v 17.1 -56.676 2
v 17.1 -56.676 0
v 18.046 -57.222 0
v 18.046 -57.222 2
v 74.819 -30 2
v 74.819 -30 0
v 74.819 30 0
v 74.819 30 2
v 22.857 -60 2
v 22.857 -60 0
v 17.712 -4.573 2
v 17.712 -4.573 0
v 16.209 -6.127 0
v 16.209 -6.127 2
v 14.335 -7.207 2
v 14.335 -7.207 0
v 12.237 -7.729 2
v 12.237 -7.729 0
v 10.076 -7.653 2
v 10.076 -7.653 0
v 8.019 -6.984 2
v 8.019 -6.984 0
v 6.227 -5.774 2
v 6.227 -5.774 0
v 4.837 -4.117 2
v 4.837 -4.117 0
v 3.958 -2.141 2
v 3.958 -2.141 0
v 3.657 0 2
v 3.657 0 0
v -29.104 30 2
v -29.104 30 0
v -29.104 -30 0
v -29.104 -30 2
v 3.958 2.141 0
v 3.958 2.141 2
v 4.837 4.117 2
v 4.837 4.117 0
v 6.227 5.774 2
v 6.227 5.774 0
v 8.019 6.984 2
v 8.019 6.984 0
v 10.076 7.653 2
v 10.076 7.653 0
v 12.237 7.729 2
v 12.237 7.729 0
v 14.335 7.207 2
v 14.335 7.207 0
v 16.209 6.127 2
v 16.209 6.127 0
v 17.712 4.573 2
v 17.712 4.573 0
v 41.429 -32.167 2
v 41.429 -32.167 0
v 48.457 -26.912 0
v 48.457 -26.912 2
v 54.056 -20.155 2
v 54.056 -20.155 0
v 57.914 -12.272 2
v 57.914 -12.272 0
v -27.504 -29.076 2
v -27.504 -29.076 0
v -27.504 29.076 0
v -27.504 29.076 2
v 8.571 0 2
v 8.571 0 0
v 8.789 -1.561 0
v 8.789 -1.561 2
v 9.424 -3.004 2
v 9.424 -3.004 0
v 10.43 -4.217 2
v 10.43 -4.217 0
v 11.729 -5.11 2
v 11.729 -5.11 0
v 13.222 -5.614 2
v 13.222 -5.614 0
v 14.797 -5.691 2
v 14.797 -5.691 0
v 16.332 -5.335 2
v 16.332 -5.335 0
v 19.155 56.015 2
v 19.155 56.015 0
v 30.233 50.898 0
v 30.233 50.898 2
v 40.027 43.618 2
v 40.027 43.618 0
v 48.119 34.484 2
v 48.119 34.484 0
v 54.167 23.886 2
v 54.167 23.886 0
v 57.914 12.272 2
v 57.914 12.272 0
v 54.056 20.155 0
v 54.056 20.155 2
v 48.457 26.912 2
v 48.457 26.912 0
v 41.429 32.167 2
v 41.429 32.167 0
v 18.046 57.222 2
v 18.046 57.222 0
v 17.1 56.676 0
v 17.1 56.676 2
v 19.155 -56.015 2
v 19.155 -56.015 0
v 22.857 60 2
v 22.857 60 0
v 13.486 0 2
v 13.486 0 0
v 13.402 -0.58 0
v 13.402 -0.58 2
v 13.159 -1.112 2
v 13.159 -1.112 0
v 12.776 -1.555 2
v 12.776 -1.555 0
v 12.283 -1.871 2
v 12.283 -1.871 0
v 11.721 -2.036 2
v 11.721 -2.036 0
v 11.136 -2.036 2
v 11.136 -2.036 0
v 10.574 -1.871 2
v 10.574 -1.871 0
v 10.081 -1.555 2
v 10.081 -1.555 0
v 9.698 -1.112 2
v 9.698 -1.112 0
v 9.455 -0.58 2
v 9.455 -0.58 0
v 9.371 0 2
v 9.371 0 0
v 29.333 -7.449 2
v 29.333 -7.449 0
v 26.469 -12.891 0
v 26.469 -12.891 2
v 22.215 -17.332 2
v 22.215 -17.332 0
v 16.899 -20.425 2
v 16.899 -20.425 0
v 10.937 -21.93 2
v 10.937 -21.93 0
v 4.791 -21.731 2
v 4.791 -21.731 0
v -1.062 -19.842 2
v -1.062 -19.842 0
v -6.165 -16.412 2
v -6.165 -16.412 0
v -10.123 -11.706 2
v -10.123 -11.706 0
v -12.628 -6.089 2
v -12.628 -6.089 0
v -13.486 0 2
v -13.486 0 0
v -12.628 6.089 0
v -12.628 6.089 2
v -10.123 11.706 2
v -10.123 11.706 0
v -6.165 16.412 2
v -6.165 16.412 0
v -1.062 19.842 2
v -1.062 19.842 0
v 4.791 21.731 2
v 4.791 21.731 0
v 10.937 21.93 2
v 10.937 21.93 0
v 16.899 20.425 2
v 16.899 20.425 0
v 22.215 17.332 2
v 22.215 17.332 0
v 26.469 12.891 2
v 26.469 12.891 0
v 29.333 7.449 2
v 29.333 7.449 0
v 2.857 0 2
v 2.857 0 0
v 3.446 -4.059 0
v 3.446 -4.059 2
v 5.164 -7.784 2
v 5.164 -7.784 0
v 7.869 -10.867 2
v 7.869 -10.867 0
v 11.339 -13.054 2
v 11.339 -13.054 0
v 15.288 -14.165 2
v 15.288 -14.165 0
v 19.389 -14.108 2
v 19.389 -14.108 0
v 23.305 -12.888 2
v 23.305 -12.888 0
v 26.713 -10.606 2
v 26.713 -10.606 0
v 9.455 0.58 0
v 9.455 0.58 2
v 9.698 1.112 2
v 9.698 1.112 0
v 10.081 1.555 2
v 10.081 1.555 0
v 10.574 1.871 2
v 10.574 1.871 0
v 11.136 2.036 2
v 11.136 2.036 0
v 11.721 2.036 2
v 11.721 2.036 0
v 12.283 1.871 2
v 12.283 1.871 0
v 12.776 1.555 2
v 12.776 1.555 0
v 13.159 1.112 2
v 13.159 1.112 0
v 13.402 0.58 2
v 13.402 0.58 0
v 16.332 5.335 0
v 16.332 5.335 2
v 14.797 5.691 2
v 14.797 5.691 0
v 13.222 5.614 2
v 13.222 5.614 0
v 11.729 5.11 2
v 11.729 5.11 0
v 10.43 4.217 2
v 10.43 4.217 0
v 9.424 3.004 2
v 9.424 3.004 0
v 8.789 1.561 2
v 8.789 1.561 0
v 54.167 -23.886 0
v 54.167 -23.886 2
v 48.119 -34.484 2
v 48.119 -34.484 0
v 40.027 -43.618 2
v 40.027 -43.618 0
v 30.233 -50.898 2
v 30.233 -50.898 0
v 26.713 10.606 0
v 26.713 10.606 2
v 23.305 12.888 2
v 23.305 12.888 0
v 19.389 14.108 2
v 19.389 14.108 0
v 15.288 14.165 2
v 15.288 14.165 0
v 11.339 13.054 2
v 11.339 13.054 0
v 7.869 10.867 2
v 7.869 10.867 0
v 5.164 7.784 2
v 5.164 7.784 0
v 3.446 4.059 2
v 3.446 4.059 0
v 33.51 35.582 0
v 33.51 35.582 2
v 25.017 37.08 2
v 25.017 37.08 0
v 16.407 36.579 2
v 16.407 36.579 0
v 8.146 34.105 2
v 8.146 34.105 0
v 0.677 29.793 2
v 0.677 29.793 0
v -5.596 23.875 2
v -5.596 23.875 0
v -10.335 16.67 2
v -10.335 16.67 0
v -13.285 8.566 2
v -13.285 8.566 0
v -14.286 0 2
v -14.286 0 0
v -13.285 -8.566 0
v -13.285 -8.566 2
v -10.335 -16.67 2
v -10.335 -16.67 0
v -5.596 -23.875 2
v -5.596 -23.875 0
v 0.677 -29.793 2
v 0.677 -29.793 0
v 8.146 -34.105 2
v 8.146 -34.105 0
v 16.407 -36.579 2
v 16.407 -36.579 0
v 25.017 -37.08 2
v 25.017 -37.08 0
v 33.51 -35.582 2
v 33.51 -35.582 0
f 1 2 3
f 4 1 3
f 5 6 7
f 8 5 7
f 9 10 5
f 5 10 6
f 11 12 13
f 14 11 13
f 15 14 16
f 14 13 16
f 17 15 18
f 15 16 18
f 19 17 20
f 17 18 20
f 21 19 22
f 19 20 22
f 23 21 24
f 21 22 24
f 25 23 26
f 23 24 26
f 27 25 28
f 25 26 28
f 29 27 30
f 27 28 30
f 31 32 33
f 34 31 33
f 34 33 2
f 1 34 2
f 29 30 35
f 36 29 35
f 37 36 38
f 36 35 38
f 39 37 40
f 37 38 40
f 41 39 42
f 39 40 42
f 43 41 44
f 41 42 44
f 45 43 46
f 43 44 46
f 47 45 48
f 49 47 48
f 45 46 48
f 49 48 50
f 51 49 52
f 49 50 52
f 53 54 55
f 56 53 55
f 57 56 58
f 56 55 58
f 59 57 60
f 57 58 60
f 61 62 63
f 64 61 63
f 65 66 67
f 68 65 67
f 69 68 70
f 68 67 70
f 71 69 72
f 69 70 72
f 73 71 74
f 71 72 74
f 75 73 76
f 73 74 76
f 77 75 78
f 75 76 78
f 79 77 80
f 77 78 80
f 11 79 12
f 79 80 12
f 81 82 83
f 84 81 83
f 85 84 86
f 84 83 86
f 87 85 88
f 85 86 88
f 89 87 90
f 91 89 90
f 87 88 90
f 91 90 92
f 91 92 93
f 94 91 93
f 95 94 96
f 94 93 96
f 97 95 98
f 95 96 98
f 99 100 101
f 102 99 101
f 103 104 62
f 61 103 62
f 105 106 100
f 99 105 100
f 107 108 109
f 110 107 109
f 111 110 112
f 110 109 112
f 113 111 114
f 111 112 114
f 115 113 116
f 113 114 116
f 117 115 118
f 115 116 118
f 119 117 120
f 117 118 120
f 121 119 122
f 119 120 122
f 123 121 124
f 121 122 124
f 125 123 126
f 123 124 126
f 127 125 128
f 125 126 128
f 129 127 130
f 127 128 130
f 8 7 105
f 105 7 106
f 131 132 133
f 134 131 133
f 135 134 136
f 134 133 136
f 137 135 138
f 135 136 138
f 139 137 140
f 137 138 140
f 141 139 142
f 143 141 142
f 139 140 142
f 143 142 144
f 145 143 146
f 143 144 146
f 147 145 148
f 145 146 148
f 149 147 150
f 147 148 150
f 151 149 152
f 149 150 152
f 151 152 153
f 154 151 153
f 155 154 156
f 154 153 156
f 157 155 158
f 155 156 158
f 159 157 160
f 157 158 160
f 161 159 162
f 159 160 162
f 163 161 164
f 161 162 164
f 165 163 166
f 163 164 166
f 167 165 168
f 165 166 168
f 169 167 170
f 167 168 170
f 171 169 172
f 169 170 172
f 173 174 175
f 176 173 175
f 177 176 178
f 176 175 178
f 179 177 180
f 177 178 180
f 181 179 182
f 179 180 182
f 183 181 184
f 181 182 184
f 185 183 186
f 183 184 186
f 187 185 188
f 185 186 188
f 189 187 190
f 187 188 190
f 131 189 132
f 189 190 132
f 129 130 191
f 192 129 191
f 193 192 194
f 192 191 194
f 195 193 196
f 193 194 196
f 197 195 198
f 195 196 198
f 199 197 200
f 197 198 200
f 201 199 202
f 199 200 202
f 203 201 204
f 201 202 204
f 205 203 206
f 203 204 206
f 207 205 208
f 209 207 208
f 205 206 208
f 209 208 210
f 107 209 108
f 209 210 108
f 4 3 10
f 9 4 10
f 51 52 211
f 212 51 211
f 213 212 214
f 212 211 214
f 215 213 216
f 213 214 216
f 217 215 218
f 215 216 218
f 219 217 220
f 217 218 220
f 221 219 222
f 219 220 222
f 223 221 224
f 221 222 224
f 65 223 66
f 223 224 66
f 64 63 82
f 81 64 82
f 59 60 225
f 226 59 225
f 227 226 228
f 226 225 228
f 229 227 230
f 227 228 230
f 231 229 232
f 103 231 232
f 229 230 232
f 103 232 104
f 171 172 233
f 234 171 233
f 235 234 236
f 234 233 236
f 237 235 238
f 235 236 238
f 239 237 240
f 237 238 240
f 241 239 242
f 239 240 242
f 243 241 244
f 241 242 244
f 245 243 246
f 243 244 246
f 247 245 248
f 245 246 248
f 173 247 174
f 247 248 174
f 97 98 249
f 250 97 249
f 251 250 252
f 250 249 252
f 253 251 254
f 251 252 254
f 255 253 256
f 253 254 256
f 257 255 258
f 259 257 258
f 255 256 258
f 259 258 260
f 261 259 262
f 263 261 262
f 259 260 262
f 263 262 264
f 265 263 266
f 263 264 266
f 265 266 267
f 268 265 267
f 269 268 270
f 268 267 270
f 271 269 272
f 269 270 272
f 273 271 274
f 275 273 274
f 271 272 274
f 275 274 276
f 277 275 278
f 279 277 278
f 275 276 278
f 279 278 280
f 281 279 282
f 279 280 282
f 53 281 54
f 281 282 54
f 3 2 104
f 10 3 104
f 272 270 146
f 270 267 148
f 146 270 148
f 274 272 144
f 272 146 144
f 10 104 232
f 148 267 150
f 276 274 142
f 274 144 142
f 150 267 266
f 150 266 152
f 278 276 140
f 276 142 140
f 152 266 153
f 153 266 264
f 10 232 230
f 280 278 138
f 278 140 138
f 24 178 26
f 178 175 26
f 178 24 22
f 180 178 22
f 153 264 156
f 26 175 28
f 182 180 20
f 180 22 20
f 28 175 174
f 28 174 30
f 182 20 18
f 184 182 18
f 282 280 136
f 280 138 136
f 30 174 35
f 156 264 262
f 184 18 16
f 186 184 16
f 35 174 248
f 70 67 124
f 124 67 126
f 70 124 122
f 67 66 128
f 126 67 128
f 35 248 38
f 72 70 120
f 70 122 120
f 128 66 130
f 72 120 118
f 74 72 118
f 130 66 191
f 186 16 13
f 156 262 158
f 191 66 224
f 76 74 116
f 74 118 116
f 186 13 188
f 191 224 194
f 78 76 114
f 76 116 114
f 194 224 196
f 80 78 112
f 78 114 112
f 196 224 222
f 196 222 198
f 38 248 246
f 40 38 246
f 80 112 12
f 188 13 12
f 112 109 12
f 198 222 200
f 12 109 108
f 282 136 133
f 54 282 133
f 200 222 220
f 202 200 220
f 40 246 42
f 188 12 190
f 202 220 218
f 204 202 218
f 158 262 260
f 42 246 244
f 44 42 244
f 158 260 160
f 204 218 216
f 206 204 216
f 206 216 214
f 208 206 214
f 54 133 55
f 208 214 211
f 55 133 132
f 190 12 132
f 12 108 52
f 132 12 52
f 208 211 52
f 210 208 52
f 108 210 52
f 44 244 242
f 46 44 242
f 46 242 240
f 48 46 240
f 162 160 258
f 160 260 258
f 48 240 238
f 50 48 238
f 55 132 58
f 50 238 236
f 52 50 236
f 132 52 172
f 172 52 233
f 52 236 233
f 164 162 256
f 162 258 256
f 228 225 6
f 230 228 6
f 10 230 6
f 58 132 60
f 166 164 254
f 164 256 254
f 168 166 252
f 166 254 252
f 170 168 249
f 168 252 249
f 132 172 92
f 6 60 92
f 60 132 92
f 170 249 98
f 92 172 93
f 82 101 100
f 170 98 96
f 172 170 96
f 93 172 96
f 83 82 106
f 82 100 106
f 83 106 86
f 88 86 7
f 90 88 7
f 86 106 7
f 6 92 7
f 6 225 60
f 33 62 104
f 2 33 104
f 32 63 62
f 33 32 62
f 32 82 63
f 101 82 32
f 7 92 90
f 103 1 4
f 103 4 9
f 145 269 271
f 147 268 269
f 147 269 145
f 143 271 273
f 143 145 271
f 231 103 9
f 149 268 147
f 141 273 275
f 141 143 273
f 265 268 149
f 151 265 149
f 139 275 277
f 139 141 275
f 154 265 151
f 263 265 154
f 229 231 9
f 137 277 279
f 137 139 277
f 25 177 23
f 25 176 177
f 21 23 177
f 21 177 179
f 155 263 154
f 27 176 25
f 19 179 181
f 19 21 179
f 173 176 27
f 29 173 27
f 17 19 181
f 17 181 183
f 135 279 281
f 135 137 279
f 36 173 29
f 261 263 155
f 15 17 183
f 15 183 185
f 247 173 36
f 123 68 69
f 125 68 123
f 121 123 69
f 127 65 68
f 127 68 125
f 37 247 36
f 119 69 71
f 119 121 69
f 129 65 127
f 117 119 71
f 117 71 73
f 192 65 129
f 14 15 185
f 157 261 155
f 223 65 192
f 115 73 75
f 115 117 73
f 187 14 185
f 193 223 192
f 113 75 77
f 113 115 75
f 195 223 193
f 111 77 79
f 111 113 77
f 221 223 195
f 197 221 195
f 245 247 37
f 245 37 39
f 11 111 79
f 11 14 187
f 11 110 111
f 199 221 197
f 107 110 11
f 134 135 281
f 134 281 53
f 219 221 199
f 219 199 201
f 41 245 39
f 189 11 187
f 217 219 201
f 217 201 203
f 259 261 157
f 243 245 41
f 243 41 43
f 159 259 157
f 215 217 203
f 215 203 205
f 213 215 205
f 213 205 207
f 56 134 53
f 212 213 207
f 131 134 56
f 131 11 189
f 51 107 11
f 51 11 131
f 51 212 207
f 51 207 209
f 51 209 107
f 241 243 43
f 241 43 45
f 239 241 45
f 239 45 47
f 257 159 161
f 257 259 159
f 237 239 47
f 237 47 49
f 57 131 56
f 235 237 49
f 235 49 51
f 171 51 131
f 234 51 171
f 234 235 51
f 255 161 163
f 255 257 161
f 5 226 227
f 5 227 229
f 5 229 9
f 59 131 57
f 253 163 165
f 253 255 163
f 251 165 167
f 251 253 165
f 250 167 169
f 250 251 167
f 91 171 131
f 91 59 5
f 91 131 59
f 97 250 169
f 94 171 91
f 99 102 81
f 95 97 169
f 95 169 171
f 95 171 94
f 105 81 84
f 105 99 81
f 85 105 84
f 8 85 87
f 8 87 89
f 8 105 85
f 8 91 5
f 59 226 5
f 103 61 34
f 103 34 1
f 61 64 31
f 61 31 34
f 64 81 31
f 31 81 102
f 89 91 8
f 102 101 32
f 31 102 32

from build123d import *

# Parameters (mm, degrees)
F1_DEPTH = 2


# Not quite as in the source:
# - a feature names something its author has since deleted; it is built from what else it names


with BuildPart() as f1:
    # F0 (on Top) → F1 (new body)
    with BuildSketch(Plane.XY):
        with BuildLine():
            ThreePointArc((57.9139967595, 12.2722697167), (51.4568761016, 23.699090905), (41.428568188, 32.1666578549))
            ThreePointArc((41.428568188, 32.1666578549), (4.2857110581, 32.1666578623), (-14.2857175262, 2.97e-08))
            ThreePointArc((-14.2857175262, 2.97e-08), (-13.7653951877, 4.8492709465), (-12.2281175262, 9.477763266))
            ThreePointArc((-12.2281175262, 9.477763266), (9.6494218868, 33.857930499), (42.2568983073, 30.7319480028))
            ThreePointArc((42.2568983073, 30.7319480028), (54.3309771484, 18.1714285714), (59.1716666402, 1.434709852))
            ThreePointArc((59.1716666402, 1.434709852), (59.1929135394, 0.7174947657), (59.1999967595, 0))
            ThreePointArc((59.1999967595, 0), (58.8776189941, 6.1697325712), (57.9139967595, 12.2722697167))
        make_face()
        with BuildLine():
            ThreePointArc((-12.2281175262, -9.477763266), (-13.765395194, -4.8492709174), (-14.2857175262, 2.97e-08))
            ThreePointArc((-14.2857175262, 2.97e-08), (4.2857110323, -32.1666578474), (41.428568188, -32.1666578549))
            ThreePointArc((41.428568188, -32.1666578549), (51.4568761016, -23.699090905), (57.9139967595, -12.2722697167))
            ThreePointArc((57.9139967595, -12.2722697167), (58.8776189941, -6.1697325712), (59.1999967595, 0))
            ThreePointArc((59.1999967595, 0), (59.1929135394, -0.7174947657), (59.1716666402, -1.434709852))
            ThreePointArc((59.1716666402, -1.434709852), (54.3309771484, -18.1714285714), (42.2568983073, -30.7319480028))
            ThreePointArc((42.2568983073, -30.7319480028), (9.6494218868, -33.857930499), (-12.2281175262, -9.477763266))
        make_face()
        with BuildLine():
            ThreePointArc((-12.2281175262, 9.477763266), (-13.7653951877, 4.8492709465), (-14.2857175262, 2.97e-08))
            ThreePointArc((-14.2857175262, 2.97e-08), (-13.765395194, -4.8492709174), (-12.2281175262, -9.477763266))
            ThreePointArc((-12.2281175262, -9.477763266), (-13.1699457223, -4.7804170624), (-13.4857175262, 2.704e-07))
            ThreePointArc((-13.4857175262, 2.704e-07), (-13.1699456867, 4.7804173304), (-12.2281175262, 9.477763266))
        make_face()
        with BuildLine():
            ThreePointArc((19.1553909751, 56.0152735639), (44.3089741522, 39.2600881611), (57.9139967595, 12.2722697167))
            ThreePointArc((57.9139967595, 12.2722697167), (59.4747834067, 6.2241465278), (59.9999967595, 0))
            ThreePointArc((59.9999967595, 0), (49.011359006, 34.6104950953), (20.070451068, 56.5435837549))
            Line((20.070451068, 56.5435837549), (19.1553909751, 56.0152735639))
        make_face()
        with BuildLine():
            ThreePointArc((59.9999967595, 0), (59.4747834067, 6.2241465278), (57.9139967595, 12.2722697167))
            ThreePointArc((57.9139967595, 12.2722697167), (58.8776189941, 6.1697325712), (59.1999967595, 0))
            ThreePointArc((59.1999967595, 0), (58.8776189941, -6.1697325712), (57.9139967595, -12.2722697167))
            ThreePointArc((57.9139967595, -12.2722697167), (59.4747834067, -6.2241465278), (59.9999967595, 0))
        make_face()
        with BuildLine():
            ThreePointArc((42.2568983073, 30.7319480028), (9.6494218868, 33.857930499), (-12.2281175262, 9.477763266))
            ThreePointArc((-12.2281175262, 9.477763266), (13.4206962629, 22.3368205217), (31.428568188, 0))
            ThreePointArc((31.428568188, 0), (13.4206962629, -22.3368205217), (-12.2281175262, -9.477763266))
            ThreePointArc((-12.2281175262, -9.477763266), (9.6494218868, -33.857930499), (42.2568983073, -30.7319480028))
            ThreePointArc((42.2568983073, -30.7319480028), (54.3309771484, -18.1714285714), (59.1716666402, -1.434709852))
            ThreePointArc((59.1716666402, -1.434709852), (59.1929135394, -0.7174947657), (59.1999967595, 0))
            ThreePointArc((59.1999967595, 0), (59.1929135394, 0.7174947657), (59.1716666402, 1.434709852))
            ThreePointArc((59.1716666402, 1.434709852), (54.3309771484, 18.1714285714), (42.2568983073, 30.7319480028))
        make_face()
        with BuildLine():
            ThreePointArc((31.428568188, 0), (13.4206962629, 22.3368205217), (-12.2281175262, 9.477763266))
            ThreePointArc((-12.2281175262, 9.477763266), (-13.1699456867, 4.7804173304), (-13.4857175262, 2.704e-07))
            ThreePointArc((-13.4857175262, 2.704e-07), (4.7908132688, 21.7307276329), (29.332568188, 7.4493287138))
            ThreePointArc((29.332568188, 7.4493287138), (30.8945884868, 3.8692930325), (31.428568188, 0))
        make_face()
        with BuildLine():
            ThreePointArc((-13.4857175262, 2.704e-07), (-13.1699457223, -4.7804170624), (-12.2281175262, -9.477763266))
            ThreePointArc((-12.2281175262, -9.477763266), (13.4206962629, -22.3368205217), (31.428568188, 0))
            ThreePointArc((31.428568188, 0), (30.8945884868, -3.8692930325), (29.332568188, -7.4493287138))
            ThreePointArc((29.332568188, -7.4493287138), (4.7908130024, -21.7307275866), (-13.4857175262, 2.704e-07))
        make_face()
        with BuildLine():
            ThreePointArc((20.070451068, -56.5435837549), (49.011359006, -34.6104950953), (59.9999967595, 0))
            ThreePointArc((59.9999967595, 0), (59.4747834067, -6.2241465278), (57.9139967595, -12.2722697167))
            ThreePointArc((57.9139967595, -12.2722697167), (44.3089741522, -39.2600881611), (19.1553909751, -56.0152735639))
            Line((19.1553909751, -56.0152735639), (20.070451068, -56.5435837549))
        make_face()
        with BuildLine():
            ThreePointArc((20.070451068, 56.5435837549), (49.011359006, 34.6104950953), (59.9999967595, 0))
            ThreePointArc((59.9999967595, 0), (49.011359006, -34.6104950953), (20.070451068, -56.5435837549))
            Line((20.070451068, -56.5435837549), (22.8571396166, -58.1524791386))
            Line((22.8571396166, -58.1524791386), (73.2186638437, -29.0762395693))
            Line((73.2186638437, -29.0762395693), (73.2186638437, 29.0762395693))
            Line((73.2186638437, 29.0762395693), (22.8571396166, 58.1524791386))
            Line((22.8571396166, 58.1524791386), (20.070451068, 56.5435837549))
        make_face()
        with BuildLine():
            Line((-27.5043846104, 29.0762395693), (19.1553909751, 56.0152735639))
            ThreePointArc((19.1553909751, 56.0152735639), (18.1309499488, 56.3551997286), (17.1004817443, 56.6763920278))
            Line((17.1004817443, 56.6763920278), (-29.1043846104, 30))
            Line((-29.1043846104, 30), (-29.1043846104, -30))
            Line((-29.1043846104, -30), (17.1004817443, -56.6763920278))
            ThreePointArc((17.1004817443, -56.6763920278), (18.1309499488, -56.3551997286), (19.1553909751, -56.0152735639))
            Line((19.1553909751, -56.0152735639), (-27.5043846104, -29.0762395693))
            Line((-27.5043846104, -29.0762395693), (-27.5043846104, 29.0762395693))
        make_face()
        with BuildLine():
            ThreePointArc((17.1004817443, 56.6763920278), (18.1309499488, 56.3551997286), (19.1553909751, 56.0152735639))
            Line((19.1553909751, 56.0152735639), (20.070451068, 56.5435837549))
            ThreePointArc((20.070451068, 56.5435837549), (19.0610073309, 56.891808514), (18.0455263515, 57.2220137862))
            Line((18.0455263515, 57.2220137862), (17.1004817443, 56.6763920278))
        make_face()
        with BuildLine():
            ThreePointArc((29.332568188, -7.4493287138), (30.8945884868, -3.8692930325), (31.428568188, 0))
            ThreePointArc((31.428568188, 0), (30.8945884868, 3.8692930325), (29.332568188, 7.4493287138))
            ThreePointArc((29.332568188, 7.4493287138), (30.3021529406, 3.7806121953), (30.628568188, 0))
            ThreePointArc((30.628568188, 0), (30.3021529406, -3.7806121953), (29.332568188, -7.4493287138))
        make_face()
        with BuildLine():
            Line((22.8571396166, -58.1524791386), (20.070451068, -56.5435837549))
            ThreePointArc((20.070451068, -56.5435837549), (19.0610073309, -56.891808514), (18.0455263515, -57.2220137862))
            Line((18.0455263515, -57.2220137862), (22.8571396166, -60))
            Line((22.8571396166, -60), (74.8186638437, -30))
            Line((74.8186638437, -30), (74.8186638437, 30))
            Line((74.8186638437, 30), (22.8571396166, 60))
            Line((22.8571396166, 60), (18.0455263515, 57.2220137862))
            ThreePointArc((18.0455263515, 57.2220137862), (19.0610073309, 56.891808514), (20.070451068, 56.5435837549))
            Line((20.070451068, 56.5435837549), (22.8571396166, 58.1524791386))
            Line((22.8571396166, 58.1524791386), (73.2186638437, 29.0762395693))
            Line((73.2186638437, 29.0762395693), (73.2186638437, -29.0762395693))
            Line((73.2186638437, -29.0762395693), (22.8571396166, -58.1524791386))
        make_face()
        with BuildLine():
            ThreePointArc((18.0455263515, -57.2220137862), (19.0610073309, -56.891808514), (20.070451068, -56.5435837549))
            Line((20.070451068, -56.5435837549), (19.1553909751, -56.0152735639))
            ThreePointArc((19.1553909751, -56.0152735639), (18.1309499488, -56.3551997286), (17.1004817443, -56.6763920278))
            Line((17.1004817443, -56.6763920278), (18.0455263515, -57.2220137862))
        make_face()
        with BuildLine():
            ThreePointArc((30.628568188, 0), (30.3021529406, 3.7806121953), (29.332568188, 7.4493287138))
            ThreePointArc((29.332568188, 7.4493287138), (13.2735608698, 13.7517345845), (2.8571396166, 0))
            ThreePointArc((2.8571396166, 0), (3.3577591094, 2.8864214127), (4.8011396166, 5.4356764331))
            ThreePointArc((4.8011396166, 5.4356764331), (19.9202319053, 13.1966155216), (30.628568188, 0))
        make_face()
        with BuildLine():
            ThreePointArc((2.8571396166, 0), (13.2735608698, -13.7517345845), (29.332568188, -7.4493287138))
            ThreePointArc((29.332568188, -7.4493287138), (30.3021529406, -3.7806121953), (30.628568188, 0))
            ThreePointArc((30.628568188, 0), (19.9202319053, -13.1966155216), (4.8011396166, -5.4356764331))
            ThreePointArc((4.8011396166, -5.4356764331), (3.3577591094, -2.8864214127), (2.8571396166, 0))
        make_face()
        with BuildLine():
            ThreePointArc((4.8011396166, 5.4356764331), (3.3577591094, 2.8864214127), (2.8571396166, 0))
            ThreePointArc((2.8571396166, 0), (3.3577591094, -2.8864214127), (4.8011396166, -5.4356764331))
            ThreePointArc((4.8011396166, -5.4356764331), (3.9462383831, -2.7773780141), (3.6571396166, -2.26e-08))
            ThreePointArc((3.6571396166, -2.26e-08), (3.9462383784, 2.7773779919), (4.8011396166, 5.4356764331))
        make_face()
        with BuildLine():
            ThreePointArc((4.8011396166, -5.4356764331), (19.9202319053, -13.1966155216), (30.628568188, 0))
            ThreePointArc((30.628568188, 0), (19.9202319053, 13.1966155216), (4.8011396166, 5.4356764331))
            ThreePointArc((4.8011396166, 5.4356764331), (14.3149896007, 8.0708090786), (19.9999967595, 0))
            ThreePointArc((19.9999967595, 0), (14.3149896007, -8.0708090786), (4.8011396166, -5.4356764331))
        make_face()
        with BuildLine():
            ThreePointArc((19.9999967595, 0), (14.3149896007, 8.0708090786), (4.8011396166, 5.4356764331))
            ThreePointArc((4.8011396166, 5.4356764331), (3.9462383784, 2.7773779919), (3.6571396166, -2.26e-08))
            ThreePointArc((3.6571396166, -2.26e-08), (9.0240010942, 7.3900716595), (17.7119967595, 4.5731419646))
            ThreePointArc((17.7119967595, 4.5731419646), (19.3960846487, 2.5567836939), (19.9999967595, 0))
        make_face()
        with BuildLine():
            ThreePointArc((3.6571396166, -2.26e-08), (3.9462383831, -2.7773780141), (4.8011396166, -5.4356764331))
            ThreePointArc((4.8011396166, -5.4356764331), (14.3149896007, -8.0708090786), (19.9999967595, 0))
            ThreePointArc((19.9999967595, 0), (19.3960846487, -2.5567836939), (17.7119967595, -4.5731419646))
            ThreePointArc((17.7119967595, -4.5731419646), (9.0240011157, -7.3900716665), (3.6571396166, -2.26e-08))
        make_face()
        with BuildLine():
            ThreePointArc((17.7119967595, -4.5731419646), (19.3960846487, -2.5567836939), (19.9999967595, 0))
            ThreePointArc((19.9999967595, 0), (19.3960846487, 2.5567836939), (17.7119967595, 4.5731419646))
            ThreePointArc((17.7119967595, 4.5731419646), (18.818639851, 2.4045670831), (19.1999967595, 0))
            ThreePointArc((19.1999967595, 0), (18.818639851, -2.4045670831), (17.7119967595, -4.5731419646))
        make_face()
        with BuildLine():
            ThreePointArc((19.1999967595, 0), (18.818639851, 2.4045670831), (17.7119967595, 4.5731419646))
            ThreePointArc((17.7119967595, 4.5731419646), (11.7289273535, 5.1103736046), (8.5714253309, 4.8e-09))
            ThreePointArc((8.5714253309, 4.8e-09), (8.9714253321, 1.4579829532), (10.0594253309, 2.5077306759))
            ThreePointArc((10.0594253309, 2.5077306759), (15.5859088323, 4.7391655168), (19.1999967595, 0))
        make_face()
        with BuildLine():
            ThreePointArc((8.5714253309, 4.8e-09), (11.7289273492, -5.1103736024), (17.7119967595, -4.5731419646))
            ThreePointArc((17.7119967595, -4.5731419646), (18.818639851, -2.4045670831), (19.1999967595, 0))
            ThreePointArc((19.1999967595, 0), (15.5859088323, -4.7391655168), (10.0594253309, -2.5077306759))
            ThreePointArc((10.0594253309, -2.5077306759), (8.9714253297, -1.457982949), (8.5714253309, 4.8e-09))
        make_face()
        with BuildLine():
            ThreePointArc((10.0594253309, 2.5077306759), (8.9714253321, 1.4579829532), (8.5714253309, 4.8e-09))
            ThreePointArc((8.5714253309, 4.8e-09), (8.9714253297, -1.457982949), (10.0594253309, -2.5077306759))
            ThreePointArc((10.0594253309, -2.5077306759), (9.5465455326, -1.3001978026), (9.3714253309, -3.2e-08))
            ThreePointArc((9.3714253309, -3.2e-08), (9.5465455241, 1.3001977717), (10.0594253309, 2.5077306759))
        make_face()
        with BuildLine():
            ThreePointArc((10.0594253309, -2.5077306759), (15.5859088323, -4.7391655168), (19.1999967595, 0))
            ThreePointArc((19.1999967595, 0), (15.5859088323, 4.7391655168), (10.0594253309, 2.5077306759))
            ThreePointArc((10.0594253309, 2.5077306759), (12.8865511392, 2.4571428571), (14.2857110452, 0))
            ThreePointArc((14.2857110452, 0), (12.8865511392, -2.4571428571), (10.0594253309, -2.5077306759))
        make_face()
        with BuildLine():
            ThreePointArc((14.2857110452, 0), (12.8865511392, 2.4571428571), (10.0594253309, 2.5077306759))
            ThreePointArc((10.0594253309, 2.5077306759), (9.5465455241, 1.3001977717), (9.3714253309, -3.2e-08))
            ThreePointArc((9.3714253309, -3.2e-08), (9.5465455326, -1.3001978026), (10.0594253309, -2.5077306759))
            ThreePointArc((10.0594253309, -2.5077306759), (12.8865511392, -2.4571428571), (14.2857110452, 0))
        make_face()
        with BuildLine():
            ThreePointArc((13.4857110452, 0), (11.4285682041, -2.0571428571), (9.3714253309, -3.2e-08))
            ThreePointArc((9.3714253309, -3.2e-08), (11.428568172, 2.0571428571), (13.4857110452, 0))
        make_face(mode=Mode.SUBTRACT)
    extrude(amount=F1_DEPTH)


solid = f1.part
